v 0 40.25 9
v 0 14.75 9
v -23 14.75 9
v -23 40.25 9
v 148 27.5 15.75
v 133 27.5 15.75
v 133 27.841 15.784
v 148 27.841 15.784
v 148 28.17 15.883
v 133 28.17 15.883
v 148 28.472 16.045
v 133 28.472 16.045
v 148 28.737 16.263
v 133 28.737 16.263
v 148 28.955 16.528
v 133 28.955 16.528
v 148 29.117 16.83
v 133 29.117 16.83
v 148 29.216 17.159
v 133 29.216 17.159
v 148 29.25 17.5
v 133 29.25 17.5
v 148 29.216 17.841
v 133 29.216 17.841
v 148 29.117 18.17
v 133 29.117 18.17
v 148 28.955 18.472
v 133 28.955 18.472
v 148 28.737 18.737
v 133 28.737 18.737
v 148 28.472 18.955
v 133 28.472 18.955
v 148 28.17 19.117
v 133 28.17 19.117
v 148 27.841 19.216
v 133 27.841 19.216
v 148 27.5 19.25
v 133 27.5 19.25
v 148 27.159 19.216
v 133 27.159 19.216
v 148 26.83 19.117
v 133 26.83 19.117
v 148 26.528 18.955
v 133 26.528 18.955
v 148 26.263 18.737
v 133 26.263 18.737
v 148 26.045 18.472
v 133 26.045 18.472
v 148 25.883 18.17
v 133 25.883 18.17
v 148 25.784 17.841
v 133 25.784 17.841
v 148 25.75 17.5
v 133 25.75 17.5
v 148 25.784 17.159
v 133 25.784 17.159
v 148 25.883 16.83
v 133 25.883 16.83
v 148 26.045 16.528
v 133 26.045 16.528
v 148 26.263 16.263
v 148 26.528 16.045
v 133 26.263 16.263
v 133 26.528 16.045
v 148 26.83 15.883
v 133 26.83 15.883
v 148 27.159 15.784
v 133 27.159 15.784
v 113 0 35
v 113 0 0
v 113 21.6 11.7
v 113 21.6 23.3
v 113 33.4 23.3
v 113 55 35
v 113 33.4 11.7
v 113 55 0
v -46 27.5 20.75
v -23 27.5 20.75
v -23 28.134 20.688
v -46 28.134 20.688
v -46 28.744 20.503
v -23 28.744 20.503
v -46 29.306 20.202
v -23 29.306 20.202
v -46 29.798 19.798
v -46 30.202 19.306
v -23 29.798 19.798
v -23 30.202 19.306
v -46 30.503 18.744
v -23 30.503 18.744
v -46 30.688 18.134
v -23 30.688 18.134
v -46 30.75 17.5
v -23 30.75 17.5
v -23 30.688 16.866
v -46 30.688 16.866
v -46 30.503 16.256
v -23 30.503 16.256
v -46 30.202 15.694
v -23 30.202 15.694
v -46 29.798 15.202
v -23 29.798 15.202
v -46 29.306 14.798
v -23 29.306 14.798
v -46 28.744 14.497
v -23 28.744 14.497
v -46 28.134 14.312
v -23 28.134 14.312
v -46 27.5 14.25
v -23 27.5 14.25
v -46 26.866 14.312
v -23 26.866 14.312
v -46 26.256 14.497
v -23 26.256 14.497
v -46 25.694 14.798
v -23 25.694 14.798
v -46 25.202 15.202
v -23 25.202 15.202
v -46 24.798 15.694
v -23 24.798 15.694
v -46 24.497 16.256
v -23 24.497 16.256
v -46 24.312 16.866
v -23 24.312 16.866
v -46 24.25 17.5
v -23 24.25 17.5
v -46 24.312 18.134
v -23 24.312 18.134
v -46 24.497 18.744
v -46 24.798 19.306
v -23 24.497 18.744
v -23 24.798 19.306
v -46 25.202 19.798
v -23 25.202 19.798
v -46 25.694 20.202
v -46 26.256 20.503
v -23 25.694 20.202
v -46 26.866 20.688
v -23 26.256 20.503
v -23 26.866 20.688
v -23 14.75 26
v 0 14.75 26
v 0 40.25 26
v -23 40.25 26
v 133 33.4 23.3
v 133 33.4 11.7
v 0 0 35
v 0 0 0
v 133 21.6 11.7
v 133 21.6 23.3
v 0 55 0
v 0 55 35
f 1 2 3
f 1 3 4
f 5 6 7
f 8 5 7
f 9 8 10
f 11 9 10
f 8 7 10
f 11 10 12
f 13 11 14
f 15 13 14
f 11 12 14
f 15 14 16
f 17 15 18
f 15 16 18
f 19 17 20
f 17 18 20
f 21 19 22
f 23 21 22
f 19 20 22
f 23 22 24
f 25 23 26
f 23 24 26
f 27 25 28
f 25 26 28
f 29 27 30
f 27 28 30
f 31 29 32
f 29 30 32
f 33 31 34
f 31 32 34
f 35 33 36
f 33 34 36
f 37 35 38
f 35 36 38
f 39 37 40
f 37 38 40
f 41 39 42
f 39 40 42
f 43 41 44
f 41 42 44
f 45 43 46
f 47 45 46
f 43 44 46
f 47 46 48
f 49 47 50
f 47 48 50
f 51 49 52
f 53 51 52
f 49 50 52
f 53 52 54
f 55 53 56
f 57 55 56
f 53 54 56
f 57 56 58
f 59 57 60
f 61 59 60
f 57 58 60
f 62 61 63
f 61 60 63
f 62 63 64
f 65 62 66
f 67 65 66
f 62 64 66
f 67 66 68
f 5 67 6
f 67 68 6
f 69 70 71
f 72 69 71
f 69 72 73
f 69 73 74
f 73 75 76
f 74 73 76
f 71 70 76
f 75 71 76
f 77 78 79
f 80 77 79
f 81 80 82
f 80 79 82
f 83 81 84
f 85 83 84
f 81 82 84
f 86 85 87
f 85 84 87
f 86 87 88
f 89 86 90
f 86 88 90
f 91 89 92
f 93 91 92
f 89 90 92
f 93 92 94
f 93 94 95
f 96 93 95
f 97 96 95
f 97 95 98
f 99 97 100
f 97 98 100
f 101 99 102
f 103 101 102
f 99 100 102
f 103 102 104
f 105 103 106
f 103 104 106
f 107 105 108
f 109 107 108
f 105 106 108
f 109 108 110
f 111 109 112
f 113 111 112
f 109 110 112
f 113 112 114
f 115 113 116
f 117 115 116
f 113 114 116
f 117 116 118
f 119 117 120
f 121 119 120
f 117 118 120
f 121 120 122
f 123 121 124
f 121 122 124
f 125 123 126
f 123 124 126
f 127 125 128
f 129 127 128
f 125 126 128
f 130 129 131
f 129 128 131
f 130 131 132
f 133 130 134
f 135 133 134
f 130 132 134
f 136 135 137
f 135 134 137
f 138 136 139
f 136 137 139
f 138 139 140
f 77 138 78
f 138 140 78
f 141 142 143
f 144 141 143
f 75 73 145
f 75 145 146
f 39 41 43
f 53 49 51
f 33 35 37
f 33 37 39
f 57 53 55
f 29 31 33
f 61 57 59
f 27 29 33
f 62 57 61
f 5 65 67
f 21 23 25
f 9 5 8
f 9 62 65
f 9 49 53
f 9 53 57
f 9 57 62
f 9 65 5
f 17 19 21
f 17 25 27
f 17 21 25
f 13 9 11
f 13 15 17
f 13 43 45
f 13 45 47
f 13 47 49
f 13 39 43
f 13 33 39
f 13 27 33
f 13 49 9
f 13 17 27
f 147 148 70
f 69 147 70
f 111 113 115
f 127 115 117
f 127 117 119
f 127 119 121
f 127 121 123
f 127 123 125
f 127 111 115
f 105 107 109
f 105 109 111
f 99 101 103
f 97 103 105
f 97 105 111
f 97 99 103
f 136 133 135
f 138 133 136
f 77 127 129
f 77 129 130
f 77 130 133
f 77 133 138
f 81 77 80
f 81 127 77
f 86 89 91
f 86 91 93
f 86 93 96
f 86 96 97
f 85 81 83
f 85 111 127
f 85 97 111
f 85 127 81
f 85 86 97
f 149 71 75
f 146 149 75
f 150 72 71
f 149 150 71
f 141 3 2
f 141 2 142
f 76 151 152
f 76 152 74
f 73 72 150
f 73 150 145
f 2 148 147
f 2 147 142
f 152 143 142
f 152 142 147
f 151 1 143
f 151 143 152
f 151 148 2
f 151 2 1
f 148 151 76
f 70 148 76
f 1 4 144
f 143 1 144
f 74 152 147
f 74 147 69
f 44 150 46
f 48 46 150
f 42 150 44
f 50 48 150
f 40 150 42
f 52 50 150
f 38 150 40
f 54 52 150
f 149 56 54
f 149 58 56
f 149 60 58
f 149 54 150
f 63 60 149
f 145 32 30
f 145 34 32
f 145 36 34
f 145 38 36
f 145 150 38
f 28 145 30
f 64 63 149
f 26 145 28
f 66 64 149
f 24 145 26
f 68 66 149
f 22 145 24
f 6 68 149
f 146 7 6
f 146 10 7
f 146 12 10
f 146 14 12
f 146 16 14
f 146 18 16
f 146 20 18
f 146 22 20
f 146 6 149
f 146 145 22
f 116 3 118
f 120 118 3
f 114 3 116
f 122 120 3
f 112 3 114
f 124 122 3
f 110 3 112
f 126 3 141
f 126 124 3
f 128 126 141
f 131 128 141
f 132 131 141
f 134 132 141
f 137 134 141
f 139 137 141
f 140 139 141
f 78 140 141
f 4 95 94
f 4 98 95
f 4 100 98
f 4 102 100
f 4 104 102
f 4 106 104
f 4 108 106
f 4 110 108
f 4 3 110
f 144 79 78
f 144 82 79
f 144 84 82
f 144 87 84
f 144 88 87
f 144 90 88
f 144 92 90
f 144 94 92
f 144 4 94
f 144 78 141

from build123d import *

# Parameters (mm, degrees)
SKETCH1_W           = 113
SKETCH1_H           = 55
BOSS_EXTRUDE2_DEPTH = 35
SKETCH3_W           = 11.6
SKETCH3_H           = 11.8
BOSS_EXTRUDE3_DEPTH = 20
SKETCH4_R           = 1.75
BOSS_EXTRUDE4_DEPTH = 15
SKETCH5_W           = 17
SKETCH5_H           = 25.5
BOSS_EXTRUDE5_DEPTH = 23
SKETCH6_R           = 3.25
BOSS_EXTRUDE6_DEPTH = 23


with BuildPart() as part:
    # Sketch1 → Boss-Extrude2 (new body)
    with BuildSketch(Plane.XY):
        with Locations((56.5, 27.5)):
            Rectangle(SKETCH1_W, SKETCH1_H)
    extrude(amount=BOSS_EXTRUDE2_DEPTH)

    # Sketch3 → Boss-Extrude3 (add)
    with BuildSketch(Plane(origin=(113, 0, 0), x_dir=(0, 0, -1), z_dir=(1, 0, 0))):
        with Locations((-17.5, 27.5)):
            Rectangle(SKETCH3_W, SKETCH3_H)
    extrude(amount=BOSS_EXTRUDE3_DEPTH)

    # Sketch4 → Boss-Extrude4 (add)
    with BuildSketch(Plane(origin=(133, 0, 0), x_dir=(0, 0, -1), z_dir=(1, 0, 0))):
        with Locations((-17.5, 27.5)):
            Circle(SKETCH4_R)
    extrude(amount=BOSS_EXTRUDE4_DEPTH)

    # Sketch5 → Boss-Extrude5 (add)
    with BuildSketch(Plane.ZY):
        with Locations((17.5, 27.5)):
            Rectangle(SKETCH5_W, SKETCH5_H)
    extrude(amount=BOSS_EXTRUDE5_DEPTH)

    # Sketch6 → Boss-Extrude6 (add)
    with BuildSketch(Plane.ZY.offset(23)):
        with Locations((17.5, 27.5)):
            Circle(SKETCH6_R)
    extrude(amount=BOSS_EXTRUDE6_DEPTH)


solid = part.part
